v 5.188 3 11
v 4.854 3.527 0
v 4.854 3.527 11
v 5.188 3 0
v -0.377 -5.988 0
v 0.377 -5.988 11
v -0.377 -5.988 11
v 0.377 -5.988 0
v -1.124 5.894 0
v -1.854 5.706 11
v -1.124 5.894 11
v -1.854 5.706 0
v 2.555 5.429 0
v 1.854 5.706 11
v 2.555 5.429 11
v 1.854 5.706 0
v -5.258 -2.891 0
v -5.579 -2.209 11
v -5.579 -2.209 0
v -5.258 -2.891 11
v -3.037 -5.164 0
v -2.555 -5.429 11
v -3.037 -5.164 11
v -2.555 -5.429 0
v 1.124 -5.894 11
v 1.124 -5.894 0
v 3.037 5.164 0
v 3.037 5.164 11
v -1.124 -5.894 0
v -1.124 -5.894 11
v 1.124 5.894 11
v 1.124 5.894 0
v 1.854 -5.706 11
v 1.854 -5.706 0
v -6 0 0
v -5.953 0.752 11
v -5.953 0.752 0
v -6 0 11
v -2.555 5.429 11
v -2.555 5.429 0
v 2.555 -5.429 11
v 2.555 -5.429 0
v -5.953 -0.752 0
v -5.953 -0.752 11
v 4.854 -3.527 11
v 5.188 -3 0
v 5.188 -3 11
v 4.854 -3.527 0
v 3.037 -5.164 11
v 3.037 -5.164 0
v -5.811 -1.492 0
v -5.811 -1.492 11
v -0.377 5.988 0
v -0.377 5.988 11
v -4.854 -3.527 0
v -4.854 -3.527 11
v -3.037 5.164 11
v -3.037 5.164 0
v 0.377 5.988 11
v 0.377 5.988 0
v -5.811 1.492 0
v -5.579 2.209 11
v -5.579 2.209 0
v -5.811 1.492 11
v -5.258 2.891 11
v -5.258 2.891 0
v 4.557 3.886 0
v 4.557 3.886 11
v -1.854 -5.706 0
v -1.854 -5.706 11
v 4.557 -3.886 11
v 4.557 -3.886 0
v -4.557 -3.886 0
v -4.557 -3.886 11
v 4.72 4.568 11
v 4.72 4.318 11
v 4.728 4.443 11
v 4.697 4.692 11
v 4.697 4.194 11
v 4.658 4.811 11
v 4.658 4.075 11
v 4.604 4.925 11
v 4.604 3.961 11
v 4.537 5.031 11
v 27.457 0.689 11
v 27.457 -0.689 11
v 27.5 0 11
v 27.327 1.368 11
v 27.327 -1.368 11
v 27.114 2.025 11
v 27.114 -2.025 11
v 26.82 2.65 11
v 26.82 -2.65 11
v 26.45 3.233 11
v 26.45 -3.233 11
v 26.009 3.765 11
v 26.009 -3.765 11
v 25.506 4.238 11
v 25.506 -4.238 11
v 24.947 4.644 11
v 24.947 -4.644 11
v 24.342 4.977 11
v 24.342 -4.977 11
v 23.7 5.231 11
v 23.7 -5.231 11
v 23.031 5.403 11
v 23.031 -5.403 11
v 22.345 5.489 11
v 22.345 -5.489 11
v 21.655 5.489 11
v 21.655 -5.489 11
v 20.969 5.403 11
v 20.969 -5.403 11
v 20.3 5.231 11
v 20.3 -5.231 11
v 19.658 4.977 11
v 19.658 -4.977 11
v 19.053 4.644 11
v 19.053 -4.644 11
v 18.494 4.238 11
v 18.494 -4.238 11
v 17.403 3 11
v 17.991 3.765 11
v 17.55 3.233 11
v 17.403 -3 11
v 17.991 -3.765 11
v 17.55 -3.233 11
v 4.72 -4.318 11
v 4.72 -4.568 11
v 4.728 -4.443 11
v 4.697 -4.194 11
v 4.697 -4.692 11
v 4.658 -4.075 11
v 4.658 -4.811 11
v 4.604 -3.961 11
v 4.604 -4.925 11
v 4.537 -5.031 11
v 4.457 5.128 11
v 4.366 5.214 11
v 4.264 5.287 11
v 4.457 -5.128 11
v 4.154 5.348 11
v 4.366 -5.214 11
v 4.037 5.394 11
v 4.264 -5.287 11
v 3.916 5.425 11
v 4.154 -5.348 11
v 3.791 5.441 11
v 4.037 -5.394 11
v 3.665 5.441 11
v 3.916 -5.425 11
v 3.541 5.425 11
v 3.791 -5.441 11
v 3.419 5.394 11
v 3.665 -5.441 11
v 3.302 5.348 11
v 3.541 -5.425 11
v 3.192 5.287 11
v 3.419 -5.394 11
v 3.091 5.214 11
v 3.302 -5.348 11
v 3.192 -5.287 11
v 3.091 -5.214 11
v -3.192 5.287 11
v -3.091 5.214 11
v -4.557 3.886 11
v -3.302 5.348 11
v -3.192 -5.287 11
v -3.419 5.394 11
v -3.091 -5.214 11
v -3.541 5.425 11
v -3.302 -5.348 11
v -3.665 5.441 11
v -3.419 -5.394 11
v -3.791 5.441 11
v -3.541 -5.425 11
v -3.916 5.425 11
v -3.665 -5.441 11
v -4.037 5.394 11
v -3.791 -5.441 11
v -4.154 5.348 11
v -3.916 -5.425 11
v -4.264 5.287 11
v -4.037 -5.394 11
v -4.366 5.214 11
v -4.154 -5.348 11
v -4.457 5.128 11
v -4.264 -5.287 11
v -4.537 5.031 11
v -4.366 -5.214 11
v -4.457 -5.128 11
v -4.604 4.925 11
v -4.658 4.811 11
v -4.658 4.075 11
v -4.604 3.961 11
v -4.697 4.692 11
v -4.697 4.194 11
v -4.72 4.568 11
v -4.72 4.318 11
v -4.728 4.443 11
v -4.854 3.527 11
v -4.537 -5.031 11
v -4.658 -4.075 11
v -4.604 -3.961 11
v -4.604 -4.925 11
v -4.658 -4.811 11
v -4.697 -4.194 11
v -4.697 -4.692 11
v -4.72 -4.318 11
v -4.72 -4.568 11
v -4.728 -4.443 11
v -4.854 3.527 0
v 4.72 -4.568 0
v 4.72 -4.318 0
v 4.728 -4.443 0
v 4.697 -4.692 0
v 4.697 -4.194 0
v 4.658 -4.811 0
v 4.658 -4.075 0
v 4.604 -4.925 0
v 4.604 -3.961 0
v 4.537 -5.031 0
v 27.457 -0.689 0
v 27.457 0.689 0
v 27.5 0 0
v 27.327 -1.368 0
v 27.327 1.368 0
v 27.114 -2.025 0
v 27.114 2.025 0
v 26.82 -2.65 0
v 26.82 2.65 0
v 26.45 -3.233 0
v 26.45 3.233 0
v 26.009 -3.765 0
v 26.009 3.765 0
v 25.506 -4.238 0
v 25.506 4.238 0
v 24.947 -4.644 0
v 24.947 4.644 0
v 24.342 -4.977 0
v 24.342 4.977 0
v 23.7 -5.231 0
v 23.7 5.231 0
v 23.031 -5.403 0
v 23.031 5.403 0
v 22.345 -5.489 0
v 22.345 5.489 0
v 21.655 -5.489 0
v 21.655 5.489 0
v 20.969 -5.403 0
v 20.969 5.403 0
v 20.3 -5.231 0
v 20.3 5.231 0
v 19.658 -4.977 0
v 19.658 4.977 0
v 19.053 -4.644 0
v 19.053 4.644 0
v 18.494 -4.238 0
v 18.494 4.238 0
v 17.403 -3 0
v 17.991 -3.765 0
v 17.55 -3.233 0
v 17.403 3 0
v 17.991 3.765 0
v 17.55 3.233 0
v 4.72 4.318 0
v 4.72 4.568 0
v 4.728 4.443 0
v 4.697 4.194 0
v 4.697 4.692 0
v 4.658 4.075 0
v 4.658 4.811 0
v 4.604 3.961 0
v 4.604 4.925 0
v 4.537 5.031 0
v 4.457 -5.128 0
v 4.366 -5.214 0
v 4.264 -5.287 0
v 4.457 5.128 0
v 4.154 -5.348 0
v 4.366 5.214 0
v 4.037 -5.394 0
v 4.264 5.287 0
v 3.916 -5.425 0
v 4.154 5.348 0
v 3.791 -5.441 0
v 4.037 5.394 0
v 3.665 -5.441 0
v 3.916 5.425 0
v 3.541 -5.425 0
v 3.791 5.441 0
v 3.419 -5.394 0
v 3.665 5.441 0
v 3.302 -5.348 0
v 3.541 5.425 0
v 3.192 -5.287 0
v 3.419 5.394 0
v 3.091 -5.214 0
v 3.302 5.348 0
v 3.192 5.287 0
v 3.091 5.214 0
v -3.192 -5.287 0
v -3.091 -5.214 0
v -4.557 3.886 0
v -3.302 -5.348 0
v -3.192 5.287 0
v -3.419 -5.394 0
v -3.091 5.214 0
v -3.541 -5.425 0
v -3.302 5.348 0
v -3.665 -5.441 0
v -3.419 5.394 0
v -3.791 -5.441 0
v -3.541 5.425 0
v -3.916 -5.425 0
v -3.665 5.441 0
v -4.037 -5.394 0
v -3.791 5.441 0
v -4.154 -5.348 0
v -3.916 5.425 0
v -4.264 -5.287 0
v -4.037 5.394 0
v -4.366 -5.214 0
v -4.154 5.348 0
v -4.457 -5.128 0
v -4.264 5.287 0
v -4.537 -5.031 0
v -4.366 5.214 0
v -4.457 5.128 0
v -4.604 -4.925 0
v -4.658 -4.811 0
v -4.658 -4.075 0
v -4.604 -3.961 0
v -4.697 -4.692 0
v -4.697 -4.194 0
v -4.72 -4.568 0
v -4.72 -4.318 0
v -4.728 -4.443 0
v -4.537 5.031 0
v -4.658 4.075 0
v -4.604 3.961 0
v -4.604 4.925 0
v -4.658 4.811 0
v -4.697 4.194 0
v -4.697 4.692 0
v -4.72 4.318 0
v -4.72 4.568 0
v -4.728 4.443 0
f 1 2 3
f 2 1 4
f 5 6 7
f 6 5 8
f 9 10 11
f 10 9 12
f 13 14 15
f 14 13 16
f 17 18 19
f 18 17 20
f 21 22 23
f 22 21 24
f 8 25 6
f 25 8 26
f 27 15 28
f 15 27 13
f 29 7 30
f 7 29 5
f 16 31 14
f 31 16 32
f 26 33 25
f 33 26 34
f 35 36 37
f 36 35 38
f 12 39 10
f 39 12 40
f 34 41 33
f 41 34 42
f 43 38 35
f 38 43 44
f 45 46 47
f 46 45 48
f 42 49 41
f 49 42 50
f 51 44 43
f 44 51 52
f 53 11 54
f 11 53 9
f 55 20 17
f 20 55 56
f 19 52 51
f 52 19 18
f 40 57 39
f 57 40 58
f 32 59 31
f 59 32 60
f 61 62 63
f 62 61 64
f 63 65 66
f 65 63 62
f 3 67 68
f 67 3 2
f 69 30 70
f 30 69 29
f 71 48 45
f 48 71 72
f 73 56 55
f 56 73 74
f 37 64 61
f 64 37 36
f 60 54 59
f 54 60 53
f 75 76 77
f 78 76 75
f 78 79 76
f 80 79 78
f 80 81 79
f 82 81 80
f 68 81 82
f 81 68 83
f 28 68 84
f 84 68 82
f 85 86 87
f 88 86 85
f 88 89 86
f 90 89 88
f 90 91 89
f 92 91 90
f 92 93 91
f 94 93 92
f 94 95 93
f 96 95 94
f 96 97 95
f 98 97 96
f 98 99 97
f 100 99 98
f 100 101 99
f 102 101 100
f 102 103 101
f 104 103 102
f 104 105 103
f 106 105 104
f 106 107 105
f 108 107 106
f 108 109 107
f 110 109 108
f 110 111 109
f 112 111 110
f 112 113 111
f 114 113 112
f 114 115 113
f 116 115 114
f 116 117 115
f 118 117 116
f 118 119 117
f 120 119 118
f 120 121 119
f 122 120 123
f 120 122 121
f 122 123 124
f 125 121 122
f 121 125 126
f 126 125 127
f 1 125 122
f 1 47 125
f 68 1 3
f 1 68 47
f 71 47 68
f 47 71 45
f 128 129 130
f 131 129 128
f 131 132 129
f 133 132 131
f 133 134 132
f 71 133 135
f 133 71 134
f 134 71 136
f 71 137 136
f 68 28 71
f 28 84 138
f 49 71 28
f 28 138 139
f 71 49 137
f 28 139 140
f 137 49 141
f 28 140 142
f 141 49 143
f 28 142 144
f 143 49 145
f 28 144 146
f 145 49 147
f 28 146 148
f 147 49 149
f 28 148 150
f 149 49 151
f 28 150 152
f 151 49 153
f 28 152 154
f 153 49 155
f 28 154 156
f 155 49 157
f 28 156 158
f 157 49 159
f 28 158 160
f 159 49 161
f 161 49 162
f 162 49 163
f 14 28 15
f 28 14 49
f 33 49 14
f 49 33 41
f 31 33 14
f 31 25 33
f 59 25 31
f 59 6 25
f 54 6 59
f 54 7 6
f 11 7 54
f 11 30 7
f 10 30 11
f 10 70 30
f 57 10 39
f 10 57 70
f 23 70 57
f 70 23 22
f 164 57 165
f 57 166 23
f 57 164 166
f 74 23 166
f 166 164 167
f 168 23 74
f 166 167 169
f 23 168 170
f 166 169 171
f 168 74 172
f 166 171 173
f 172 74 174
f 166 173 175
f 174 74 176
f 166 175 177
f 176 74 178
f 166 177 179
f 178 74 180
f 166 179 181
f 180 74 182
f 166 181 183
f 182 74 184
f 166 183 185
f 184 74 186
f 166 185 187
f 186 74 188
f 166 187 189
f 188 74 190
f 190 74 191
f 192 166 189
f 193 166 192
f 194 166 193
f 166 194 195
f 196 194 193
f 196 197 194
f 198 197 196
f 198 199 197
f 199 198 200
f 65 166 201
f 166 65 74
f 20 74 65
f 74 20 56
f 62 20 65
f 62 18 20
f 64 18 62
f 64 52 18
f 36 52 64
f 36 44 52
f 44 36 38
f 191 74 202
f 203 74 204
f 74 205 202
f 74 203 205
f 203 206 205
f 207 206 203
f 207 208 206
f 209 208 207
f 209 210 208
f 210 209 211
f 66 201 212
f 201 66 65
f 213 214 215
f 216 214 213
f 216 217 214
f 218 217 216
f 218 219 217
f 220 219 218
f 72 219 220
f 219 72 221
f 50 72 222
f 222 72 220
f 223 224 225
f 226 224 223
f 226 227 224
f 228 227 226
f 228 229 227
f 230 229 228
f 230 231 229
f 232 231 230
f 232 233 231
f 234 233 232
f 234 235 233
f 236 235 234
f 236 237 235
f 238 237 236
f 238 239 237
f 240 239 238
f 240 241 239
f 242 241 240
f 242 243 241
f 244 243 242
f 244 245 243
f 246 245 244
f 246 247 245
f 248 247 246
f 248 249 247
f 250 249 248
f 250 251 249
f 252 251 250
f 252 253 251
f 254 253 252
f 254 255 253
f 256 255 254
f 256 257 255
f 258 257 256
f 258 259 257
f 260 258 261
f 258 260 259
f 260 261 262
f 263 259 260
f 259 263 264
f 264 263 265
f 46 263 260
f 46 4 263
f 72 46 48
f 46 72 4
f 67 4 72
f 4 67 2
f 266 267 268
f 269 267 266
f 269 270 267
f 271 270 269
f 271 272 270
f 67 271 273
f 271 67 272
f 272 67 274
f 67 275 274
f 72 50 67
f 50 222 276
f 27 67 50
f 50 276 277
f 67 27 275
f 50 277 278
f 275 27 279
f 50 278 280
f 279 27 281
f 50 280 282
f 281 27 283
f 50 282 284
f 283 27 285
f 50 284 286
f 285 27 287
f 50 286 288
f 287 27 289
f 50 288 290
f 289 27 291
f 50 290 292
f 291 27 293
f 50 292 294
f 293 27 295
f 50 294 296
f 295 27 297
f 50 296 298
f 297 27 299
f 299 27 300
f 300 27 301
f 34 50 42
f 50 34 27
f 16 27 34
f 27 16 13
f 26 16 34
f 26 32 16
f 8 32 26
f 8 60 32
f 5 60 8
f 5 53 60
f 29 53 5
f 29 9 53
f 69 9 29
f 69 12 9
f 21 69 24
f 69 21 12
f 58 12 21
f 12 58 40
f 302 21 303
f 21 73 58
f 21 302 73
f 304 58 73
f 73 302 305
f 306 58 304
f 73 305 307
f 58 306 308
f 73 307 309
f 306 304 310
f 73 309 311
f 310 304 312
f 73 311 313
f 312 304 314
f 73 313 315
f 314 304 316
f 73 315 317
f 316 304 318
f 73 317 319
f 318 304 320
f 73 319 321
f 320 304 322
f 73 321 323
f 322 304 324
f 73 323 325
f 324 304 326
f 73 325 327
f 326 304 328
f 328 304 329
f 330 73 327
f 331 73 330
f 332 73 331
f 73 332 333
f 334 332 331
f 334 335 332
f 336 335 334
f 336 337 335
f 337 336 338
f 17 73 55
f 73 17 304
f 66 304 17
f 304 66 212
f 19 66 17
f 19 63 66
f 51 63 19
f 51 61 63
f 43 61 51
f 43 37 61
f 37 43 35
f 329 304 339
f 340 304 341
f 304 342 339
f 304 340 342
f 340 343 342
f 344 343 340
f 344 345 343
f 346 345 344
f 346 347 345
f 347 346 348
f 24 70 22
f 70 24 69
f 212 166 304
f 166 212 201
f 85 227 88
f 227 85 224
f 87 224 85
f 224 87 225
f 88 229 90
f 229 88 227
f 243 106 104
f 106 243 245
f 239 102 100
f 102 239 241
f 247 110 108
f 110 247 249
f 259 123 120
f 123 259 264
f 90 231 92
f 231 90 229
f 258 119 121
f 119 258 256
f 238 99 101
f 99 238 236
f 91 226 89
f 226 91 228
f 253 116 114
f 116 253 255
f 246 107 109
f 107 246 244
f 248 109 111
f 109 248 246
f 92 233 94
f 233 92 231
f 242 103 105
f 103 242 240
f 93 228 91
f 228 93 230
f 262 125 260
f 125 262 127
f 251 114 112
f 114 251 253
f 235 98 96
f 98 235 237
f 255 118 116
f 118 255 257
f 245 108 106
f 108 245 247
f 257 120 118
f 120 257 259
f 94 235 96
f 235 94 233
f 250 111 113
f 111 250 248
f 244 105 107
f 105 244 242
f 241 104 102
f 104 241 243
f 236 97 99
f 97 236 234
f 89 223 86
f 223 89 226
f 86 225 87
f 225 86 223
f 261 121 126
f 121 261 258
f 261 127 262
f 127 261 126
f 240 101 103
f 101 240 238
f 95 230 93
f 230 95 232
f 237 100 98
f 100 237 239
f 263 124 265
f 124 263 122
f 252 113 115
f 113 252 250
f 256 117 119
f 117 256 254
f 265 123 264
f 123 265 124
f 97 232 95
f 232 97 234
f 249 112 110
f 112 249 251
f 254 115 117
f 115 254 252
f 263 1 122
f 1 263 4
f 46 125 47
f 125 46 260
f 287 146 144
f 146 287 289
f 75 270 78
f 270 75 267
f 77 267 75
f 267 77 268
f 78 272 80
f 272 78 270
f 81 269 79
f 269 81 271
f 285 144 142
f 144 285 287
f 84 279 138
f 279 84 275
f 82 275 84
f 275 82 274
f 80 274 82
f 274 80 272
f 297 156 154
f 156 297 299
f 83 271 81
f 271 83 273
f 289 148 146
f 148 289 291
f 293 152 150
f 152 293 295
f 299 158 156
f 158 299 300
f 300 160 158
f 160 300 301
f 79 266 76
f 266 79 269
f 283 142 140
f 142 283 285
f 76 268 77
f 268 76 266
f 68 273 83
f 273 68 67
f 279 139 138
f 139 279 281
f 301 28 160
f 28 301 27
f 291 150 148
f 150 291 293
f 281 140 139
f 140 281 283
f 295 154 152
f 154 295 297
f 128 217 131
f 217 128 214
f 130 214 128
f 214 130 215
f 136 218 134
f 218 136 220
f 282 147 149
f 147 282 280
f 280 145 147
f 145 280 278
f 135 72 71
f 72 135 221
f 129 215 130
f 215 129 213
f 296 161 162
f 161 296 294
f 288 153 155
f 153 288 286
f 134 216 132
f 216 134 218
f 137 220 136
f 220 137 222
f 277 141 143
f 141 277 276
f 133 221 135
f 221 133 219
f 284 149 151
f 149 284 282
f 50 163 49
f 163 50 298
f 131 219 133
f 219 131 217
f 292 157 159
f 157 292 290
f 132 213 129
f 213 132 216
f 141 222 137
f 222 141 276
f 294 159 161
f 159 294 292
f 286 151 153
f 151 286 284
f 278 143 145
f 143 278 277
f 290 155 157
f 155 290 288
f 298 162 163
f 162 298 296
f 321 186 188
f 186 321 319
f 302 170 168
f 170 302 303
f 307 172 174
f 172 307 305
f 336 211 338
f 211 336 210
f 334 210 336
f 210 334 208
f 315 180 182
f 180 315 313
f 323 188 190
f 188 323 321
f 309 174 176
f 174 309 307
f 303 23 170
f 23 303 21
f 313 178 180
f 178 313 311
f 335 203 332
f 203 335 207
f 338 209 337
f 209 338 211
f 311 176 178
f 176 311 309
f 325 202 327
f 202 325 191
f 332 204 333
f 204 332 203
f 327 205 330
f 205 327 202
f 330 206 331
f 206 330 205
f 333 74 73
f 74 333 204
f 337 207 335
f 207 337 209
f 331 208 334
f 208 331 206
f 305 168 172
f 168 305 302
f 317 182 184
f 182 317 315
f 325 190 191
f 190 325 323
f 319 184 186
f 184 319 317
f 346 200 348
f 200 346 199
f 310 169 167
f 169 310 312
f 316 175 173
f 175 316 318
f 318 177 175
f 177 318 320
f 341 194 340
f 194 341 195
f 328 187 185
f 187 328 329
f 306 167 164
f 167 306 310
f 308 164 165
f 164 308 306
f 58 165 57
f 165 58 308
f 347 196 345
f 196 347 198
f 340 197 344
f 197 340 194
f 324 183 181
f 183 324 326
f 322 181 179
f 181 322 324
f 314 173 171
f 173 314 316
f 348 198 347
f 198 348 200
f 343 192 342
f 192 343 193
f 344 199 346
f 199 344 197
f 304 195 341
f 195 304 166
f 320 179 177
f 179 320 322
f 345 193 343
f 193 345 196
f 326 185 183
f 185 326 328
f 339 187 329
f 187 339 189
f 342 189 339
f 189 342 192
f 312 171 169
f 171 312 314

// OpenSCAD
// [FL_INDEX: keywords="openscad, 3d_parametric, IKEA_LILLABO_to_BRIO_train_track_connector, csg_solid" | COT="Parametric OpenSCAD design from 3DCodeverse"]
// Title: IKEA LILLABO to BRIO train track connector

// IKEA to BRIO track connector

// Height of the piece. Multiplied by one so that it doesn't appear in Customizer
height = 11*1;

// Radius of the fixed end of the connector (with nods). Multiplied by one so that it doesn't appear in Customizer
fixedrad = 6*1;

// Radius of the male end of the connector. Multiplied by one so that it doesn't appear in Customizer
malerad = 5.5*1;

// Length of the connector
stud_length = 22;

// Thickness of the stud. Multiplied by one so that it doesn't appear in Customizer
studthickness = 6*1;

// Radius of the fixing nods. Multiplied by one so that it doesn't appear in Customizer
nodrad = 1*1;

// How far the fixing nods are recessed within the fixed end of the connector. The greater the value, the less they will protude.
nod_recess = 0.2;

// How the nods are distributed. Multiplied by one so that it doesn't appear in Customizer
nodangle = 40*1;

// The resolution of the curved surfaces. Multiplied by one so that it doesn't appear in Customizer
curveresolution = 50*1;

cylinder(h=height,r=fixedrad,$fn=curveresolution);
translate([stud_length,0,0]) cylinder(h=height,r=malerad,$fn=curveresolution);
translate([0,-studthickness/2,0]) cube(size=[stud_length,studthickness,height]);

// Draw the nods to grip the fixed size

nodposrad = fixedrad-nod_recess;

translate([nodposrad*sin(nodangle),nodposrad*cos(nodangle),0]) 
cylinder(h=height,r=nodrad,$fn=curveresolution);

translate([nodposrad*sin(180-nodangle),nodposrad*cos(180-nodangle),0]) 
cylinder(h=height,r=nodrad,$fn=curveresolution);

translate([nodposrad*sin(nodangle+180),nodposrad*cos(nodangle+180),0]) 
cylinder(h=height,r=nodrad,$fn=curveresolution);

translate([nodposrad*sin(-nodangle),nodposrad*cos(-nodangle),0]) 
cylinder(h=height,r=nodrad,$fn=curveresolution);
